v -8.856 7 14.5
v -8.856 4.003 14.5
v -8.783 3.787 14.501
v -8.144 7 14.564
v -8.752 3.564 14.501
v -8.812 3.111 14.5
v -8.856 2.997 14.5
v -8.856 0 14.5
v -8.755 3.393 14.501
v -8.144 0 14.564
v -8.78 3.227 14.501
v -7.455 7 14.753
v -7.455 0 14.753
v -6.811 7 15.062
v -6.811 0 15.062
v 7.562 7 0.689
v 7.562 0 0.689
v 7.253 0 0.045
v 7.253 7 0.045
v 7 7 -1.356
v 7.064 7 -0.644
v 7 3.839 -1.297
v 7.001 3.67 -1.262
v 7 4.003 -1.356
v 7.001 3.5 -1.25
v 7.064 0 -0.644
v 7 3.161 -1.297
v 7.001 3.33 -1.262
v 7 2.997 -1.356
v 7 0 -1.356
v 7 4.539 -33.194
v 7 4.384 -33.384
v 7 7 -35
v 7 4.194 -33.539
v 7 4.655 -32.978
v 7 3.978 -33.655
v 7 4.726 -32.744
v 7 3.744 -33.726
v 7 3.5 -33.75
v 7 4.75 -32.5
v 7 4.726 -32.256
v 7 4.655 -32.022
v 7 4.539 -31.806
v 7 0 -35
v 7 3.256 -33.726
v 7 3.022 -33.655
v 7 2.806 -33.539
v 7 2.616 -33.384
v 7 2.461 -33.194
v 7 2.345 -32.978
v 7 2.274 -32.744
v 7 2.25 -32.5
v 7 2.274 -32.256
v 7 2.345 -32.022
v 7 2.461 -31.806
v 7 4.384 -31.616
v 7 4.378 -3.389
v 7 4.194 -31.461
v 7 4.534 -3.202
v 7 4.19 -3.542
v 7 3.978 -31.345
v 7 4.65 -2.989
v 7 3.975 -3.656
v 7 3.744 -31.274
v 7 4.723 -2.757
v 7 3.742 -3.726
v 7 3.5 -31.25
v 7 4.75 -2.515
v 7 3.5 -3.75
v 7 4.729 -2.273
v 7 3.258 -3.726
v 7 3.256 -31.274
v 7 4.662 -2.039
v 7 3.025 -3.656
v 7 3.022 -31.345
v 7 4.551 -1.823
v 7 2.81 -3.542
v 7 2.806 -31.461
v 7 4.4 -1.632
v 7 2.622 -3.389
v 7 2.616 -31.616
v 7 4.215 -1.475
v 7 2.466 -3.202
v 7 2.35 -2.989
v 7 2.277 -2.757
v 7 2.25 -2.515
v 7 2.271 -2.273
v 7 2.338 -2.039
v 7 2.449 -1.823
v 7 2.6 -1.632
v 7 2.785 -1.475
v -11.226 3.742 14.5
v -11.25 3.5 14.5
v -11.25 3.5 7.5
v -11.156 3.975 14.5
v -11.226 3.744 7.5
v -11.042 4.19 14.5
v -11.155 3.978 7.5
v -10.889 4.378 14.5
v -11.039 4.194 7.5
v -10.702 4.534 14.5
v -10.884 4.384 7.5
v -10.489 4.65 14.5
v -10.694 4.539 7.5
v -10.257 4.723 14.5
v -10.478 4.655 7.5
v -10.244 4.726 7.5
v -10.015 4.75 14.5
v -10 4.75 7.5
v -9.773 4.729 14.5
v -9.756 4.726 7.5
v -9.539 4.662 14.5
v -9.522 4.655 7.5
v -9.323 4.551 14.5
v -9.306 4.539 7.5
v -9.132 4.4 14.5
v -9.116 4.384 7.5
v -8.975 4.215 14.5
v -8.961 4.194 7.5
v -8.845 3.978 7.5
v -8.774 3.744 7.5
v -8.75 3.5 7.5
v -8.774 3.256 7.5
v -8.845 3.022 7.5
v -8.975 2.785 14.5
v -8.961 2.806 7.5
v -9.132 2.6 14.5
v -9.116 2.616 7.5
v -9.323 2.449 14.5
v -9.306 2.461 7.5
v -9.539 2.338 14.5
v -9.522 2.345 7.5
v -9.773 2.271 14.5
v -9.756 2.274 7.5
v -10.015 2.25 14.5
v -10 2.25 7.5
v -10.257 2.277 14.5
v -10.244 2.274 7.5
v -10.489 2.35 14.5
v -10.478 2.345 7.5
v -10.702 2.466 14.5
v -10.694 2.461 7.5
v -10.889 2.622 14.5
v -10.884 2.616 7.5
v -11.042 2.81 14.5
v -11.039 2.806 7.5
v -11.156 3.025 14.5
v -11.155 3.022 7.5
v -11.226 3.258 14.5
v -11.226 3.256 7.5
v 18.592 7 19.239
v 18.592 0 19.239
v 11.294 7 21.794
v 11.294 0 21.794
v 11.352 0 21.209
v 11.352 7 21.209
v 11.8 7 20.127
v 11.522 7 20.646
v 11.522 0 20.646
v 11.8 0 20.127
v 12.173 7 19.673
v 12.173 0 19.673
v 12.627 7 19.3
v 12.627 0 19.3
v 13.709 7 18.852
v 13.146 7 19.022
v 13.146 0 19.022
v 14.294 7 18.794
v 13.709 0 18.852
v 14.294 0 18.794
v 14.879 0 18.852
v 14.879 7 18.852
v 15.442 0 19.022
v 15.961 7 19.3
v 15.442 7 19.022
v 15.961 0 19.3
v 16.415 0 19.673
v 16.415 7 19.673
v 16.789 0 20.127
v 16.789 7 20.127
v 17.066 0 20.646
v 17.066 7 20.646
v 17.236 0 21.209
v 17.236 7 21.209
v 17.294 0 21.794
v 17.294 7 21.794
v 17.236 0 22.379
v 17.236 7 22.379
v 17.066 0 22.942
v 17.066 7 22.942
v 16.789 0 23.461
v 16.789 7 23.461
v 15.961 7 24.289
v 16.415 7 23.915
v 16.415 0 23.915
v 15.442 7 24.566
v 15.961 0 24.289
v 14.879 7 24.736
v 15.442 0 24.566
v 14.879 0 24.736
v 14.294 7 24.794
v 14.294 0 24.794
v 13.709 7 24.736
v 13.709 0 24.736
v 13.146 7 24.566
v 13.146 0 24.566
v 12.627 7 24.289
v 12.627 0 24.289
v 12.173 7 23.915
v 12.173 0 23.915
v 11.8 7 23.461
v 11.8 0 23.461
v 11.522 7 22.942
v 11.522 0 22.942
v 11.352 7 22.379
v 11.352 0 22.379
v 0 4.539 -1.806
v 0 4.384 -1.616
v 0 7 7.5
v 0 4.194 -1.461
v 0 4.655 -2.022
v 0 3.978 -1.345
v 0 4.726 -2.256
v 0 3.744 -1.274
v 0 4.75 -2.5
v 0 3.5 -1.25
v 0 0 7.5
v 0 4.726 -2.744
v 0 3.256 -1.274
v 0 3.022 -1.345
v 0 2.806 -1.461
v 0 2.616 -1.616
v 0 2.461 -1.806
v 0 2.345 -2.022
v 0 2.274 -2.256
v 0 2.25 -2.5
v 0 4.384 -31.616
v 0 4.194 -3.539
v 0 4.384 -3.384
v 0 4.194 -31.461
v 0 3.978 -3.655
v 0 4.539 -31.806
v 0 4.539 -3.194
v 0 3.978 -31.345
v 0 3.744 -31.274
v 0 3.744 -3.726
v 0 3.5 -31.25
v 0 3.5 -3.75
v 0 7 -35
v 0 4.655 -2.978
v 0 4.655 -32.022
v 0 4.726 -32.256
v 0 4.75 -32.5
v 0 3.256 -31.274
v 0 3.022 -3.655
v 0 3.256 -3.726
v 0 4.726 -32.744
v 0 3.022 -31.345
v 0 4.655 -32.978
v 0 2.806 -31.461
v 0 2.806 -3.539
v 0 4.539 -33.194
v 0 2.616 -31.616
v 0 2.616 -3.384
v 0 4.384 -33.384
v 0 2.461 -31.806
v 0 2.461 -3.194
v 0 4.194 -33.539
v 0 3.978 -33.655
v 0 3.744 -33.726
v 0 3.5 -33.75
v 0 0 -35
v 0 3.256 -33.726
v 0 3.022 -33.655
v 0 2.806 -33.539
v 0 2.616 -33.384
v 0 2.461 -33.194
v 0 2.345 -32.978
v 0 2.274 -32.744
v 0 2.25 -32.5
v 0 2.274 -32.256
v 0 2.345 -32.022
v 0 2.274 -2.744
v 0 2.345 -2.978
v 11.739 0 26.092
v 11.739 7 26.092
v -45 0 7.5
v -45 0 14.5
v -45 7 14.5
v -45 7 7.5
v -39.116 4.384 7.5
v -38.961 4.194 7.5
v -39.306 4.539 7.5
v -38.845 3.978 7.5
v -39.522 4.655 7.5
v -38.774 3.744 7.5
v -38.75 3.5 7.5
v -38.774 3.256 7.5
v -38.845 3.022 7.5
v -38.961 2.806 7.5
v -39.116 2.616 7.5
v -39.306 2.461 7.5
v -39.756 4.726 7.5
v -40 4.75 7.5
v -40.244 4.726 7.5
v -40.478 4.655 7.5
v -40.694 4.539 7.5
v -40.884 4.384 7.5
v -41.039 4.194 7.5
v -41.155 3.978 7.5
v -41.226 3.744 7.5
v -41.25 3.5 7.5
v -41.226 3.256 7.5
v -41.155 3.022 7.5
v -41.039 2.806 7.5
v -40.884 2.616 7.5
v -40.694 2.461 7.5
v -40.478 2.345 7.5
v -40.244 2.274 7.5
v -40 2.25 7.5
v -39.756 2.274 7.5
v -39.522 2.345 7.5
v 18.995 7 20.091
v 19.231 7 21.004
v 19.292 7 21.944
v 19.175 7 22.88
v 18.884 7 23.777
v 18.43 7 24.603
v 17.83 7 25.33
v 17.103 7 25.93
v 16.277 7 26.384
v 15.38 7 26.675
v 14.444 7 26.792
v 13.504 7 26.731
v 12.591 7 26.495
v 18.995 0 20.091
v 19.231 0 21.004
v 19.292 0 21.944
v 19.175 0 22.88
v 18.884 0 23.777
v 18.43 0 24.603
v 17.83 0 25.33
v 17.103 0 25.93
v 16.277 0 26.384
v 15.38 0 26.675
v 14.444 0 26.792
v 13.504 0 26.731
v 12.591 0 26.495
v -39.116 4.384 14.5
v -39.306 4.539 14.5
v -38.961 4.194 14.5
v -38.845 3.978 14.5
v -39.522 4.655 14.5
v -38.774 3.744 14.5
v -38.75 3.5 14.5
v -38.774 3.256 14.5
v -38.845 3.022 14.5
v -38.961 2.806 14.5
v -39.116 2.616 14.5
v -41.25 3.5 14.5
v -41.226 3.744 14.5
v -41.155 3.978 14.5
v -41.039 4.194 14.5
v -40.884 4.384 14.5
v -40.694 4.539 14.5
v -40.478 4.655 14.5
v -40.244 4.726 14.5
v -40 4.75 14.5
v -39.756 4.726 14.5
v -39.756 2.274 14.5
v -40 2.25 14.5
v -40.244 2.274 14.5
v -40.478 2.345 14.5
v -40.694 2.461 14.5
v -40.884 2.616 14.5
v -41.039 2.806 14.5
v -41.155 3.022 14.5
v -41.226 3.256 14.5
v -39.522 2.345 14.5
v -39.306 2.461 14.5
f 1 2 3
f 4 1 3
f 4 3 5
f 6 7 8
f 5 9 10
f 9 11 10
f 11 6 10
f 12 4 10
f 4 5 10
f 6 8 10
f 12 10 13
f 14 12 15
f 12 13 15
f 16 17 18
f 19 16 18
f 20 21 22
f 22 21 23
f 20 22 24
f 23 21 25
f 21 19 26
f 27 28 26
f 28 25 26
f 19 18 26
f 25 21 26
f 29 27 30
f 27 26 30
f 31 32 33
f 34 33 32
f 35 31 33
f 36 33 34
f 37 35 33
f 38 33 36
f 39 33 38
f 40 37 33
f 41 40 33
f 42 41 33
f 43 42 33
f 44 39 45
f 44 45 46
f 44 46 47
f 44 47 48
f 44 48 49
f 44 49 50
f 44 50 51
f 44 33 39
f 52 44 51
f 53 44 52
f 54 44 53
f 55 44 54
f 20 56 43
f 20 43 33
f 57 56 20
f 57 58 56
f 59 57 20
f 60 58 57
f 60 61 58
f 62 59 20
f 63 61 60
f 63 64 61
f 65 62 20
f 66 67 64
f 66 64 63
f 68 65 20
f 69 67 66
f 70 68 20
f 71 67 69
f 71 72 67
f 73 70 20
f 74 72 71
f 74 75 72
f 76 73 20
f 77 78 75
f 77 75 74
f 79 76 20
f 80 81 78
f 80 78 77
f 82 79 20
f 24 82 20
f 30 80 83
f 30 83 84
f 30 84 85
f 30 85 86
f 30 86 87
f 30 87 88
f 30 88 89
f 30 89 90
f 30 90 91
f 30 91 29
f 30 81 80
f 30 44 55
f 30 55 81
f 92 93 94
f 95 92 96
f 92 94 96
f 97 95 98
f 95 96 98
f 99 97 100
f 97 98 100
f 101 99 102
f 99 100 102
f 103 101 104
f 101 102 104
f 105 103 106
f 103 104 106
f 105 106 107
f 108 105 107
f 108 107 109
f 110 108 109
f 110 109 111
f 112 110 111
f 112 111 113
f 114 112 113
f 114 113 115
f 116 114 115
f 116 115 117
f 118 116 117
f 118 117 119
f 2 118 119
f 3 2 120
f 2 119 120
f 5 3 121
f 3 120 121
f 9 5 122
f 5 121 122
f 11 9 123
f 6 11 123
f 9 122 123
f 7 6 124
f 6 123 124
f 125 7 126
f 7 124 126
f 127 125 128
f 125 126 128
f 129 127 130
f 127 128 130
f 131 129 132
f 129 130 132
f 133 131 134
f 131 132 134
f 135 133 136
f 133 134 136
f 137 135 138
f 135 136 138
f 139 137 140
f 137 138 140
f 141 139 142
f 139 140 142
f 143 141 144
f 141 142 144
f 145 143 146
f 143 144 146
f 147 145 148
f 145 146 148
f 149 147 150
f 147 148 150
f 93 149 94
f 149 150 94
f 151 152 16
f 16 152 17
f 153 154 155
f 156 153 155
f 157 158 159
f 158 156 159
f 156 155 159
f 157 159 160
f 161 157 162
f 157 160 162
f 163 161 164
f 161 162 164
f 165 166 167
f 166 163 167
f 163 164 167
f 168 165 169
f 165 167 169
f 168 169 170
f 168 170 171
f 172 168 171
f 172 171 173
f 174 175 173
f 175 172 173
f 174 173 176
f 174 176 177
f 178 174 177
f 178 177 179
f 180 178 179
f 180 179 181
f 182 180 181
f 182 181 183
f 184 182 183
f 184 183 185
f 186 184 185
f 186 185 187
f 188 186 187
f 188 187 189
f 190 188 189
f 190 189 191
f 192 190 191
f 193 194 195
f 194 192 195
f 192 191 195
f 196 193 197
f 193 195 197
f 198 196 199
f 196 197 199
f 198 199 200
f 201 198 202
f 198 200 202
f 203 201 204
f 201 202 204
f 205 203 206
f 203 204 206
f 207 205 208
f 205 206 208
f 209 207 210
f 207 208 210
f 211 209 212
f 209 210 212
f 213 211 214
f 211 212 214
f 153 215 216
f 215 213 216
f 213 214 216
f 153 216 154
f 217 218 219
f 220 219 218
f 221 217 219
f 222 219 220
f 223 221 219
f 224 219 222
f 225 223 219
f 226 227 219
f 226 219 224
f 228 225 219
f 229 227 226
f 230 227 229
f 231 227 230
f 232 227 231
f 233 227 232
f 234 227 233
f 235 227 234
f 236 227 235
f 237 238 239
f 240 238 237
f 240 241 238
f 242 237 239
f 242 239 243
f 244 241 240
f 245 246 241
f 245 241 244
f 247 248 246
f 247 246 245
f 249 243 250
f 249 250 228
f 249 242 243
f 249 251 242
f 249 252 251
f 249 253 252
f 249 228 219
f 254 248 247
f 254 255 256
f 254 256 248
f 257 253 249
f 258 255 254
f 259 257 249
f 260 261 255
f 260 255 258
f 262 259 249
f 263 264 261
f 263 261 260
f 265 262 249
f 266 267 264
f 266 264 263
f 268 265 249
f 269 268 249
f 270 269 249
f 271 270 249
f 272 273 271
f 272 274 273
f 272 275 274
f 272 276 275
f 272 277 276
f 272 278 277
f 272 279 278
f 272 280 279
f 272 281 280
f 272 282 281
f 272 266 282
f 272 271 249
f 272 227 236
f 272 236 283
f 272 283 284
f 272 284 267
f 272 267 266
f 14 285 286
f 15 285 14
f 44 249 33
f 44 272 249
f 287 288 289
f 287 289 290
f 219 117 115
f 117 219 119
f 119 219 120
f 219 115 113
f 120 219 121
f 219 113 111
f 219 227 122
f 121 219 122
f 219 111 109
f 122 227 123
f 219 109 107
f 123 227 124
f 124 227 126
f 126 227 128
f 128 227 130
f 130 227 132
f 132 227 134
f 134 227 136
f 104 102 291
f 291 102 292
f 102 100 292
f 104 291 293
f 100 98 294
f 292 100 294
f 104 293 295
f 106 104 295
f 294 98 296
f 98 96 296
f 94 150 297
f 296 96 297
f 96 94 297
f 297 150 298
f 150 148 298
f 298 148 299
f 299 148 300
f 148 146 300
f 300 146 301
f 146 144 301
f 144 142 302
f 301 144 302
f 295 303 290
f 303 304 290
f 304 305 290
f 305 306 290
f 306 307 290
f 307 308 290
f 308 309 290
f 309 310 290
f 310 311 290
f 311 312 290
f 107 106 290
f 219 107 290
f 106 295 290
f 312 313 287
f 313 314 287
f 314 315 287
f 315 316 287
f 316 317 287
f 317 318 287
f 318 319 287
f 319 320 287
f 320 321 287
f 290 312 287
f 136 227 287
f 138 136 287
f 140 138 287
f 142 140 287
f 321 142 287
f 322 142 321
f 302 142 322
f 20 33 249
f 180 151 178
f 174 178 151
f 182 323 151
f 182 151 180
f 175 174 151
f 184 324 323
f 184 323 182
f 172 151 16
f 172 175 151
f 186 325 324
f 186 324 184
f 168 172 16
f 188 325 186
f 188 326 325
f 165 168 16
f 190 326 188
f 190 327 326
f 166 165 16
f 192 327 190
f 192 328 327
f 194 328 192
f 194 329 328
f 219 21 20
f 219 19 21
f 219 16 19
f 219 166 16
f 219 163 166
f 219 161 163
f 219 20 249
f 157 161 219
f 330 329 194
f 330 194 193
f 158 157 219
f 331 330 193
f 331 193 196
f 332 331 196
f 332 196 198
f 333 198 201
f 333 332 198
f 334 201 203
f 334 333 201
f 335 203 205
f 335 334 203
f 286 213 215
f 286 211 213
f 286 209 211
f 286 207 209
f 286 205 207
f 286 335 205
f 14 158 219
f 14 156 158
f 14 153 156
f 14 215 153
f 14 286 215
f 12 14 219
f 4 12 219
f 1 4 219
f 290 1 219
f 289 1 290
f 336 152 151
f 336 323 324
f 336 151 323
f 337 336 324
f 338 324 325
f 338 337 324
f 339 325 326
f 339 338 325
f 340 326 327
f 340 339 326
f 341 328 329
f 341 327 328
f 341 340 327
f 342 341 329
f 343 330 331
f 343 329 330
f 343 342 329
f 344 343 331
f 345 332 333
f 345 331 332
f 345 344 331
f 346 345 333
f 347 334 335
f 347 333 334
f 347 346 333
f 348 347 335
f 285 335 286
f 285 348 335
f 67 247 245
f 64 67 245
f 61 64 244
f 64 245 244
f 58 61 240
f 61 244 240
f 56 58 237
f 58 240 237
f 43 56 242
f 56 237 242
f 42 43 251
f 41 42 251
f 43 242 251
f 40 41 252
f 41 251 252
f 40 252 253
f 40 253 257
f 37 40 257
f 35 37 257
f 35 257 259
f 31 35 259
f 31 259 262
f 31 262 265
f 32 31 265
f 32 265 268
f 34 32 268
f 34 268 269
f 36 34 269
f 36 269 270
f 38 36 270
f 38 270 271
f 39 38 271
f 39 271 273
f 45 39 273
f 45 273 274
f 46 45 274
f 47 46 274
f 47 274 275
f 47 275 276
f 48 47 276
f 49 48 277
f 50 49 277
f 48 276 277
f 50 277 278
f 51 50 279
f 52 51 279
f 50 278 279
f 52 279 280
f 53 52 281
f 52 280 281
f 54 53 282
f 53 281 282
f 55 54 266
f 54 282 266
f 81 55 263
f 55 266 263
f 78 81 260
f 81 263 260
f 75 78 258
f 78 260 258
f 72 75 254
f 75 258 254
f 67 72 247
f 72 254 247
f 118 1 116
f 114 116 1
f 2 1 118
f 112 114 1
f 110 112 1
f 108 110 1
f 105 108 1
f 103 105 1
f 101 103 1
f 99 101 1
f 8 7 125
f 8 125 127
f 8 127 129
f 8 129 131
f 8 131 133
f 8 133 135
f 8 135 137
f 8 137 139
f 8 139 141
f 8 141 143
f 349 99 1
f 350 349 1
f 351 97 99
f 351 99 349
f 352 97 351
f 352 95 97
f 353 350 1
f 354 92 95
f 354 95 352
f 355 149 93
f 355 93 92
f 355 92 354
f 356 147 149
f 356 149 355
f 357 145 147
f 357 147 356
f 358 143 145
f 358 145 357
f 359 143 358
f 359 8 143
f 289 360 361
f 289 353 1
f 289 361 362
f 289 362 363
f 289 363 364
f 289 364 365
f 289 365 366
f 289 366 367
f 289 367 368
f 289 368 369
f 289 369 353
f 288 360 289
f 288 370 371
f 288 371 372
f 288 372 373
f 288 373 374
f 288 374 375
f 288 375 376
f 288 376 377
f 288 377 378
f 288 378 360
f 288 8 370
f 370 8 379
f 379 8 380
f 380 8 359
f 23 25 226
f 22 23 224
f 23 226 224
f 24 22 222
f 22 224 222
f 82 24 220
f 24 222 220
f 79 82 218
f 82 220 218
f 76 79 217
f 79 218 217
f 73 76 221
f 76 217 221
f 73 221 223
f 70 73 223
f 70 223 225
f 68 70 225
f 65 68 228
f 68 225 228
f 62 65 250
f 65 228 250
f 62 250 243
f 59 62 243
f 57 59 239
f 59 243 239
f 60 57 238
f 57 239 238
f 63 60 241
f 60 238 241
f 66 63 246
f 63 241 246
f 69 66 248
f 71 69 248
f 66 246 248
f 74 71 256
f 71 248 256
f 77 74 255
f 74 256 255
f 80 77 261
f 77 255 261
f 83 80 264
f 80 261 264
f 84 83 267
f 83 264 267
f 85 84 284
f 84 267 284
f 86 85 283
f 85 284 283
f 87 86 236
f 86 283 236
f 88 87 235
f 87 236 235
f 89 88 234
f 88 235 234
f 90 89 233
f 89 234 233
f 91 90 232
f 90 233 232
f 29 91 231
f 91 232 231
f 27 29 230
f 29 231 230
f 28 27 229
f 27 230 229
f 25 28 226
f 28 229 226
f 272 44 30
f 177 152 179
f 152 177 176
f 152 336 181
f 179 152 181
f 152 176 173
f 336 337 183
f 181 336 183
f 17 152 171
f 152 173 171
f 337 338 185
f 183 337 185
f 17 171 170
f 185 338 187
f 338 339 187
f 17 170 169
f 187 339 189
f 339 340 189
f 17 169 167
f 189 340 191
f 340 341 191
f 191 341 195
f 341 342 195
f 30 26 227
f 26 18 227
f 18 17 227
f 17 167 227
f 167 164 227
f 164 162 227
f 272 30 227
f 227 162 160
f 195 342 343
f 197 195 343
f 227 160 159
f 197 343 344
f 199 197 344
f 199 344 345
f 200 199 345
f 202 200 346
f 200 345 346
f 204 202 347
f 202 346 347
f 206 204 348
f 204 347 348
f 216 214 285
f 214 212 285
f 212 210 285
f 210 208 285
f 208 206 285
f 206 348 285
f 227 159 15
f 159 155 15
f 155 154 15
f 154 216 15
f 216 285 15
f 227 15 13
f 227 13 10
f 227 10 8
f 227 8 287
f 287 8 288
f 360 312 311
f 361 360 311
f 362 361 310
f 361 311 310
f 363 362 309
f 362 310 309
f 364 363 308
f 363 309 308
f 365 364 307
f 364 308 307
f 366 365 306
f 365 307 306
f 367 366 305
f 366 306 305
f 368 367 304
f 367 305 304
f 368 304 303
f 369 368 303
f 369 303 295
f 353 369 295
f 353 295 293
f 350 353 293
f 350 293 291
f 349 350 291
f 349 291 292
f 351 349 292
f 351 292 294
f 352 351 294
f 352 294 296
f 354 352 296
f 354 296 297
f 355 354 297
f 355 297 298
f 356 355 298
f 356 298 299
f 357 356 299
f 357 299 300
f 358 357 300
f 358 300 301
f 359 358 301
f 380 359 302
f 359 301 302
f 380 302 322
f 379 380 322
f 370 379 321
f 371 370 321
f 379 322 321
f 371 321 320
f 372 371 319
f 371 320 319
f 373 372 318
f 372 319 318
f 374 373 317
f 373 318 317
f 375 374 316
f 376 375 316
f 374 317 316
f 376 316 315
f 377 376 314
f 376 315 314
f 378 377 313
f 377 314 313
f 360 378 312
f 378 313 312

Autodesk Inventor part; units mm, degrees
ref_plane "YZ Plane" through (0, 0, 0) normal (1, 0, 0) x (0, 1, 0)
ref_plane "XZ Plane" through (0, 0, 0) normal (0, 1, 0) x (-1, 0, 0)
ref_plane "XY Plane" through (0, 0, 0) normal (0, 0, 1) x (1, 0, 0)
sketch "Sketch1" plane through (0, 0, 0) normal (0, 1, 0) x (-1, 0, 0)
  line L0 (0, 0) -> (16.4443, 0)
  line L1 (0, 0) -> (0, -35)
  line L2 (0, -17.5) -> (0, 7.5)
  line L3 (0, 7.5) -> (45, 7.5)
  line L4 (0, -35) -> (-7, -35)
  line L5 (-7, -35) -> (-7, 14.5)
  line L6 (8.8556, 14.5) -> (45, 14.5)
  line L7 (45, 14.5) -> (45, 7.5)
  line L8 (0, 7.5) -> (-14.2941, 21.7941)
  line L9 (0, 7.5) -> (20.2149, 7.5) construction
  circle A0 centre (-14.2941, 21.7941) radius 3
  circle A1 centre (-14.2941, 21.7941) radius 5
  line L10 (-11.7387, 26.0918) -> (6.8113, 15.0619)
  arc A2 (6.8113, 15.0619) -> (8.8556, 14.5) centre (8.8556, 18.5) ccw
  line L11 (-18.5918, 19.2387) -> (-7.5619, 0.6887)
  arc A3 (-7, -1.3556) -> (-7.5619, 0.6887) centre (-11, -1.3556) ccw
  point P0 (-7, -1.3556)
  dimension "d8" = 10
  dimension "d0" = 35
  dimension "d2" = 25
  dimension "d3" = 45
  dimension "d4" = 7
  dimension "d5" = 7
  dimension "d6" = 135
  dimension "d7" = 6
  dimension "d9" = 4
extrude "Extrusion1" add sketch "Sketch1" along normal blind 7
sketch "Sketch2" plane through (0, 0, -35) normal (-1, 0, 0) x (0, 0, 1)
  line L0 (42.5, 0) -> (42.5, 7) projected
  line L1 (42.5, 3.5) -> (32.5, 3.5)
  line L2 (32.5, 3.5) -> (2.5, 3.5)
  circle A0 centre (32.5, 3.5) radius 1.25
  circle A1 centre (2.5, 3.5) radius 1.25
  point P0 (35, 0)
  dimension "d12" = 10
  dimension "d13" = 30
  dimension "d14" = 2.5
  dimension "d15" = 2.5
extrude "Extrusion2" cut sketch "Sketch2" against normal through all
sketch "Sketch3" plane through (0, 0, 7.5) normal (0, 0, -1) x (-1, 0, 0)
  line L0 (0, 0) -> (0, 7) projected
  line L1 (0, 3.5) -> (10, 3.5)
  line L2 (10, 3.5) -> (40, 3.5)
  circle A0 centre (40, 3.5) radius 1.25
  circle A1 centre (10, 3.5) radius 1.25
  dimension "d18" = 10
  dimension "d19" = 30
  dimension "d20" = 2.5
  dimension "d21" = 2.5
extrude "Extrusion3" cut sketch "Sketch3" against normal blind 10
properties part number "GPSholder" material "PC/ABS Plastic"
